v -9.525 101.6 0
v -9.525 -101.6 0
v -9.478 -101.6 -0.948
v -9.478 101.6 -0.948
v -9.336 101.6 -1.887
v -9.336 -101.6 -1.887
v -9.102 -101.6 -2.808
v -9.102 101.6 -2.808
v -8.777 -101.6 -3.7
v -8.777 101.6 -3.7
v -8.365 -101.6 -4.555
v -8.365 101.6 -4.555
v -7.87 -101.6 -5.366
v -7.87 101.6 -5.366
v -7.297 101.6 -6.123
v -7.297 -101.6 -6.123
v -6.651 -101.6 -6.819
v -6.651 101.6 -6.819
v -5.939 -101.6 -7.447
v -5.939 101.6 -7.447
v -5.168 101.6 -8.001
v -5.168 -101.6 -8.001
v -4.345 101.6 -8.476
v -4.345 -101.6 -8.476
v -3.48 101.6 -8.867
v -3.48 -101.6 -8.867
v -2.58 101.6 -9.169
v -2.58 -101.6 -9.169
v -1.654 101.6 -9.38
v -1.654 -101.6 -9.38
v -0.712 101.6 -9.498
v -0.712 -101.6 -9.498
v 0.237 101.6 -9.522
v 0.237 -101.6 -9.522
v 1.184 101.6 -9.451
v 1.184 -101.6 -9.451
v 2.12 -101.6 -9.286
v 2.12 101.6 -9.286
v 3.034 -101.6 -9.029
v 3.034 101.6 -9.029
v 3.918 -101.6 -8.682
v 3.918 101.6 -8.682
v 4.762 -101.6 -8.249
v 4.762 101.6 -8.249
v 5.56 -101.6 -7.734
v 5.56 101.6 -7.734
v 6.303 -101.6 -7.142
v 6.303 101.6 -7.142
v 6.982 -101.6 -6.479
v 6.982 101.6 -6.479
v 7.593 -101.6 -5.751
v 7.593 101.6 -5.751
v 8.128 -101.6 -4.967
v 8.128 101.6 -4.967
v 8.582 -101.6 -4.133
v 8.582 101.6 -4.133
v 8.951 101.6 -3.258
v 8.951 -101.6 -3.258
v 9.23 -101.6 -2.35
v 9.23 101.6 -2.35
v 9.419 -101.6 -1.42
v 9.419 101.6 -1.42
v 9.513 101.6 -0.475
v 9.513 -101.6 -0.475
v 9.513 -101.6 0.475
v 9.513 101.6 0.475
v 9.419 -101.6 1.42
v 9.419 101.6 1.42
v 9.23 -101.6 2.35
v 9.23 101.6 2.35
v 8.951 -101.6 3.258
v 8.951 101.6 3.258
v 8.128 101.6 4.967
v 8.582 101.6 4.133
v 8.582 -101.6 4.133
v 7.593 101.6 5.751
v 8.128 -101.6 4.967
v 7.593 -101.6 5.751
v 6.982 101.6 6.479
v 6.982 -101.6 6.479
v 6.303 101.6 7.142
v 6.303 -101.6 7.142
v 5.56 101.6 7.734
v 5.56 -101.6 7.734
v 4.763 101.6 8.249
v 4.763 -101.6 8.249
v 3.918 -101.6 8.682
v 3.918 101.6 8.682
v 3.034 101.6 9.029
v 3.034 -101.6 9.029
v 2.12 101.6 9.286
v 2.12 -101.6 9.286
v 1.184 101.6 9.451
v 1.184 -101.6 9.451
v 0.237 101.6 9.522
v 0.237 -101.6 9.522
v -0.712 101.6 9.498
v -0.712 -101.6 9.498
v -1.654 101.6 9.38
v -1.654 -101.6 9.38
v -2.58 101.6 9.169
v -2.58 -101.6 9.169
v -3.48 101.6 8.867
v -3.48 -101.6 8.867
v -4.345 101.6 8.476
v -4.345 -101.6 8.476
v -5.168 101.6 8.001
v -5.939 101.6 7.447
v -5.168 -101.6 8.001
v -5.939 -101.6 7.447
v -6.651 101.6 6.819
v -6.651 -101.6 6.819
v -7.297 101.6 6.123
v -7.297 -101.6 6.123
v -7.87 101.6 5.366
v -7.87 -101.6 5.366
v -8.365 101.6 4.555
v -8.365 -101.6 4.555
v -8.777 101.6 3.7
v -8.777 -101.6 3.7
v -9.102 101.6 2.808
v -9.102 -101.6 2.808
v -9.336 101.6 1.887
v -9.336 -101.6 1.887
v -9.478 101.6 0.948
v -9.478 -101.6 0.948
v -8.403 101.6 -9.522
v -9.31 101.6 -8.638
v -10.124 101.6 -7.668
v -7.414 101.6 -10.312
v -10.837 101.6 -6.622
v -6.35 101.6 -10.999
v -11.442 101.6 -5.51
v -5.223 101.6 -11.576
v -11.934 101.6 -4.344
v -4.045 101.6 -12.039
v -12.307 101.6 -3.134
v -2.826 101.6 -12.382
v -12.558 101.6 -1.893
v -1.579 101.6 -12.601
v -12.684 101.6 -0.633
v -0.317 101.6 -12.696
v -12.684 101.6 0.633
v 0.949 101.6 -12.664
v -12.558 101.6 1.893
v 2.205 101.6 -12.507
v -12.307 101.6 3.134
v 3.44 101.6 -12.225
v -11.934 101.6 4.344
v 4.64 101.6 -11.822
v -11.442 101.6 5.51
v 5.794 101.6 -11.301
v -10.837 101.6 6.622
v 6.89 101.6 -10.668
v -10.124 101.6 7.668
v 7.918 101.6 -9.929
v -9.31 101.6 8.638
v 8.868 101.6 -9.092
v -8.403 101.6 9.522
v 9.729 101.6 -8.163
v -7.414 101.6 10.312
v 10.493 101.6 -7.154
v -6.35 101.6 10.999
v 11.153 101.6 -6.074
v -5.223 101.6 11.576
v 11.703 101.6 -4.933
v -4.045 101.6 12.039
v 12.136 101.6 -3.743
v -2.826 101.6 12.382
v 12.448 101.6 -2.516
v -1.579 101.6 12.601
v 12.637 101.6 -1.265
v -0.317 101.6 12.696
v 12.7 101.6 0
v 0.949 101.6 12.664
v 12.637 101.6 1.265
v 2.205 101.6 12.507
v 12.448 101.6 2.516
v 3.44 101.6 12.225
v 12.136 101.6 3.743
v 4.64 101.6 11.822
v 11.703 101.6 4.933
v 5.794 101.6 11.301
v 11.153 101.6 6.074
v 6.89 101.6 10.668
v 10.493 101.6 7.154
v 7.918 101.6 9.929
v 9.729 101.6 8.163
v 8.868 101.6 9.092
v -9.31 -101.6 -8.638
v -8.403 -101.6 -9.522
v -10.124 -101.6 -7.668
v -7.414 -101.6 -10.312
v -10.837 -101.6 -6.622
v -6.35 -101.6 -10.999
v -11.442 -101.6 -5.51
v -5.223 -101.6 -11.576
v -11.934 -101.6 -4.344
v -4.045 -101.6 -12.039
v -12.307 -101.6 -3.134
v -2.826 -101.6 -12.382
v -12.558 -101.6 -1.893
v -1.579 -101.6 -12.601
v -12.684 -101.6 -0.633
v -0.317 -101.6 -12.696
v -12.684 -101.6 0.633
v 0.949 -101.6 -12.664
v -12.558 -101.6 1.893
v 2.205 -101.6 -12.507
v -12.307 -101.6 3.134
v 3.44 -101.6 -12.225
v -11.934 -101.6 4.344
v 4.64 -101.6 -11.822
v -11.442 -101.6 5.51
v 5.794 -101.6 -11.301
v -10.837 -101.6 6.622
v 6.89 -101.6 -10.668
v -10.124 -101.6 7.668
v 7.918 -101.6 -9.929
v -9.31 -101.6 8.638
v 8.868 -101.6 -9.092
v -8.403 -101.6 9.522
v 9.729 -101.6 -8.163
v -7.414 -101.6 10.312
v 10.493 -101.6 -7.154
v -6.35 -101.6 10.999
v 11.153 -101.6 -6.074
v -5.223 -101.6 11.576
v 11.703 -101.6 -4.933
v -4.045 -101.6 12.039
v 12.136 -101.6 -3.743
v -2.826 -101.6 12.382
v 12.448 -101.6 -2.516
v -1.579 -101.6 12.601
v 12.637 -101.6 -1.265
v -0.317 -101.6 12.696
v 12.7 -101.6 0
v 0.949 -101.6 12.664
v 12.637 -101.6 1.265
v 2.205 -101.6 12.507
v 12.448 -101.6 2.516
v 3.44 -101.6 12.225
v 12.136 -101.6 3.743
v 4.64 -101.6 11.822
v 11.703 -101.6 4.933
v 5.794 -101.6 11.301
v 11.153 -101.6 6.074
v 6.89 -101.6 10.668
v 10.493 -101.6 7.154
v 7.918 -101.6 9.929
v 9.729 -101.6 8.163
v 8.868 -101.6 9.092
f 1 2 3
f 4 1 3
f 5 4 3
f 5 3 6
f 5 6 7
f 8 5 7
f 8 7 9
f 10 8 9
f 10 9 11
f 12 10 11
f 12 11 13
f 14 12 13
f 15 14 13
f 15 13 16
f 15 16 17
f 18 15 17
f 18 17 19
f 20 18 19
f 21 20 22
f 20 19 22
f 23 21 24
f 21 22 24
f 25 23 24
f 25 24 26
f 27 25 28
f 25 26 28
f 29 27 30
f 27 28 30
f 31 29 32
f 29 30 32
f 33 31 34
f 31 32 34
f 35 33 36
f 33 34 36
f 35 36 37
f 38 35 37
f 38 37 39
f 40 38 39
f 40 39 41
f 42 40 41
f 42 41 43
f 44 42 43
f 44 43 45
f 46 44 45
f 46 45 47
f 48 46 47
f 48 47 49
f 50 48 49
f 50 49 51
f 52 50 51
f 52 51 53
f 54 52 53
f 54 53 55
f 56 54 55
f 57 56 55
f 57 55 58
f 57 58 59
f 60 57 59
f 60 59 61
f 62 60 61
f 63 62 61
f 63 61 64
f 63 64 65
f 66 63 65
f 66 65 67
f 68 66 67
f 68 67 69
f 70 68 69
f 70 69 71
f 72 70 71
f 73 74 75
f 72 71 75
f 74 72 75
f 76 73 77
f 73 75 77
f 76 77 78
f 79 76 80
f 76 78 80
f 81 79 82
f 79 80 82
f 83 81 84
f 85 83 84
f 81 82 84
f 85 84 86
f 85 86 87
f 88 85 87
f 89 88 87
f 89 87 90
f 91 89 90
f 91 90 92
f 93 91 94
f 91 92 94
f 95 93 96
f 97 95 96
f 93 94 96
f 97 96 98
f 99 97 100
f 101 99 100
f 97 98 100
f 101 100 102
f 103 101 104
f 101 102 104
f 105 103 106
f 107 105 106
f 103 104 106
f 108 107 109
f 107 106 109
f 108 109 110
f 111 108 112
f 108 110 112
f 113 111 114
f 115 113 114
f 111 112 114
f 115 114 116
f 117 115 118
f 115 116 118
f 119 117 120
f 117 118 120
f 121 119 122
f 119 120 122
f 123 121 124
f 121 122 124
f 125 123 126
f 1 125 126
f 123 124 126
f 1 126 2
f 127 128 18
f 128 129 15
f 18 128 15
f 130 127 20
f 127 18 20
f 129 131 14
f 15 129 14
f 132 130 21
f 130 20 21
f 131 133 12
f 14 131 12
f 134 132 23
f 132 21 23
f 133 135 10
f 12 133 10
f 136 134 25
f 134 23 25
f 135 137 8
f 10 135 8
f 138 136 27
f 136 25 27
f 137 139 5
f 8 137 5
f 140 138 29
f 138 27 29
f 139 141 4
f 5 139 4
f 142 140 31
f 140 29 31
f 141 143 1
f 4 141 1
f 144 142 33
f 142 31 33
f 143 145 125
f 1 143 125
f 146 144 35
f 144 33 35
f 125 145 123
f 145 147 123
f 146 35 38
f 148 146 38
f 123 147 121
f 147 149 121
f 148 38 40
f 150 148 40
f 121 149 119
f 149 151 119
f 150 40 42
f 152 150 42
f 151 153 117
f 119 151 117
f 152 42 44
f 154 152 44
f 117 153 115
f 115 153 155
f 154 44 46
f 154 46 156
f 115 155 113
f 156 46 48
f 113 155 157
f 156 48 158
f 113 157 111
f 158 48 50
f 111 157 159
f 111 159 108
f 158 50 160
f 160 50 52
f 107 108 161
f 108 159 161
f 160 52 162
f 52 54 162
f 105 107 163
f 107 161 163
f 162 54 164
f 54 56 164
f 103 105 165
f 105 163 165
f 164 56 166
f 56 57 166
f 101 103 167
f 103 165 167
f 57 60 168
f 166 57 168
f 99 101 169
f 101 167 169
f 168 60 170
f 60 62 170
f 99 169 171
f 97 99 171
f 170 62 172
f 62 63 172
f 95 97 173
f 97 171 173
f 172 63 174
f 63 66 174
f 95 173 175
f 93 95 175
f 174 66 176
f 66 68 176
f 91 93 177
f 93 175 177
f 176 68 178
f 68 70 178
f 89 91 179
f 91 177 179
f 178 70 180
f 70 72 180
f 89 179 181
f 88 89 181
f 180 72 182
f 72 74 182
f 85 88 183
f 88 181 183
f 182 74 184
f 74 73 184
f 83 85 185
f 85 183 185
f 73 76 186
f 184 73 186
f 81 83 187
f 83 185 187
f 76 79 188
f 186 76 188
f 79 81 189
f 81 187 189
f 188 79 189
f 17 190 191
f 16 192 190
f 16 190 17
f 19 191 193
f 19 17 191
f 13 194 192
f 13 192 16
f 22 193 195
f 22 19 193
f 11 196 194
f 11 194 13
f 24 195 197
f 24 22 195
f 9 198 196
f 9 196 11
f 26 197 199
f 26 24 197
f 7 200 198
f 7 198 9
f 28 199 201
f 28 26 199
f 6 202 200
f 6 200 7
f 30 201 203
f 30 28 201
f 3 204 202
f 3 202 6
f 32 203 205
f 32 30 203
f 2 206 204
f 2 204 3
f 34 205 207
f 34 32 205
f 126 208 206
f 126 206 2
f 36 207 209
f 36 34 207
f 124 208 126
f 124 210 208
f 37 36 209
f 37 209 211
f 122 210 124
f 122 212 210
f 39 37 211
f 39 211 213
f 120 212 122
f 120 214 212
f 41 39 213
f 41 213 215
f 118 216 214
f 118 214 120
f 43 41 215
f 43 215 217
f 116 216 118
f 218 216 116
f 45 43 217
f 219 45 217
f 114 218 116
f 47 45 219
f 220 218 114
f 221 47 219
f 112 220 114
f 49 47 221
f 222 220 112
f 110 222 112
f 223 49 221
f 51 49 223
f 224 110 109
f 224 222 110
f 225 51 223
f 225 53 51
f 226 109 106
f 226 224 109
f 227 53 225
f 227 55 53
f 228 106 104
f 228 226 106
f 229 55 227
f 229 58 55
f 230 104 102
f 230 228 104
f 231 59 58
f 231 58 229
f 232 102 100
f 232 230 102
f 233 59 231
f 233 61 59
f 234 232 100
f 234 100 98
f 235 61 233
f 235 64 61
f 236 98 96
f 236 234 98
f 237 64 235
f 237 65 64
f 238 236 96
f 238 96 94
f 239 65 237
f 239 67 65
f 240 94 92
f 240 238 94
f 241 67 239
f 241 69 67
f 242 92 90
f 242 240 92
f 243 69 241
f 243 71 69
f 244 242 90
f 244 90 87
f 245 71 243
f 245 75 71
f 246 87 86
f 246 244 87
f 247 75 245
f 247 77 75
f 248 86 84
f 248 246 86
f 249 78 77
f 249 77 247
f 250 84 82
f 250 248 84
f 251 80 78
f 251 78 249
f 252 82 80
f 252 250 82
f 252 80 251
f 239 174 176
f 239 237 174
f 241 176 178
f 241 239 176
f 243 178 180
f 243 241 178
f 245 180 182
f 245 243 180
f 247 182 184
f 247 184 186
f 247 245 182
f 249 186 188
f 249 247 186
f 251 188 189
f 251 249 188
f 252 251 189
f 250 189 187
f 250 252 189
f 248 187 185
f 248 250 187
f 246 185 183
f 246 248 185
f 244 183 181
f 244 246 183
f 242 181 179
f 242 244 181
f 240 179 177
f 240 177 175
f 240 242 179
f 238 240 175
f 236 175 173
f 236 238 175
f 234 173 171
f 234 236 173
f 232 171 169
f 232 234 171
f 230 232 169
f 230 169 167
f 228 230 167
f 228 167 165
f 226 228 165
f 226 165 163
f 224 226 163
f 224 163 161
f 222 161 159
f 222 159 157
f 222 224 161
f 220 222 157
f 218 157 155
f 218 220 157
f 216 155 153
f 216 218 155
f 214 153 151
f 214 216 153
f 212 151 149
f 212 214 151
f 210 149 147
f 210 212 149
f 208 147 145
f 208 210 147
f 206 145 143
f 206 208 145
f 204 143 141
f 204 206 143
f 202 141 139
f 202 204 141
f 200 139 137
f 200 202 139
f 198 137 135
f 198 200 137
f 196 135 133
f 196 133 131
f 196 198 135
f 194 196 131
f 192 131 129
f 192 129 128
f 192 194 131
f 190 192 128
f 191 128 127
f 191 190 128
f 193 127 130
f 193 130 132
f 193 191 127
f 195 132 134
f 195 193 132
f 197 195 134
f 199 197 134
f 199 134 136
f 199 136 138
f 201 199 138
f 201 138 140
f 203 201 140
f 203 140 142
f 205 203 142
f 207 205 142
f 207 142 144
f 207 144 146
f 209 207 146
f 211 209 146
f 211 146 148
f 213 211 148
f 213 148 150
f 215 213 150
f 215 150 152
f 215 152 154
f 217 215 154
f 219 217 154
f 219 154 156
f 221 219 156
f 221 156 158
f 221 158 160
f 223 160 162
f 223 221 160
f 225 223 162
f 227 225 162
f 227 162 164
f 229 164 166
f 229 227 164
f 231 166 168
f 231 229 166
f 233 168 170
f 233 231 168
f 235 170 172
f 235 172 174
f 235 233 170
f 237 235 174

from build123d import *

# Parameters (mm, degrees)
F0_R     = 12.7
F1_DEPTH = 101.6
F2_D     = 19.05
F3_D     = 19.05


with BuildPart() as f1:
    # F0 (on Front) → F1 (new body, symmetric)
    with BuildSketch(Plane.XZ):
        Circle(F0_R)
    extrude(amount=F1_DEPTH, both=True)

    # F2 (through all)
    with Locations(Plane(origin=(0, 0, 0), x_dir=(1, 0, 0), z_dir=(0, 1, 0))):
        with Locations((0, 0)):
            Hole(F2_D / 2)

    # F3 (through all)
    with Locations(Plane.XZ):
        with Locations((0, 0)):
            Hole(F3_D / 2)


solid = f1.part
